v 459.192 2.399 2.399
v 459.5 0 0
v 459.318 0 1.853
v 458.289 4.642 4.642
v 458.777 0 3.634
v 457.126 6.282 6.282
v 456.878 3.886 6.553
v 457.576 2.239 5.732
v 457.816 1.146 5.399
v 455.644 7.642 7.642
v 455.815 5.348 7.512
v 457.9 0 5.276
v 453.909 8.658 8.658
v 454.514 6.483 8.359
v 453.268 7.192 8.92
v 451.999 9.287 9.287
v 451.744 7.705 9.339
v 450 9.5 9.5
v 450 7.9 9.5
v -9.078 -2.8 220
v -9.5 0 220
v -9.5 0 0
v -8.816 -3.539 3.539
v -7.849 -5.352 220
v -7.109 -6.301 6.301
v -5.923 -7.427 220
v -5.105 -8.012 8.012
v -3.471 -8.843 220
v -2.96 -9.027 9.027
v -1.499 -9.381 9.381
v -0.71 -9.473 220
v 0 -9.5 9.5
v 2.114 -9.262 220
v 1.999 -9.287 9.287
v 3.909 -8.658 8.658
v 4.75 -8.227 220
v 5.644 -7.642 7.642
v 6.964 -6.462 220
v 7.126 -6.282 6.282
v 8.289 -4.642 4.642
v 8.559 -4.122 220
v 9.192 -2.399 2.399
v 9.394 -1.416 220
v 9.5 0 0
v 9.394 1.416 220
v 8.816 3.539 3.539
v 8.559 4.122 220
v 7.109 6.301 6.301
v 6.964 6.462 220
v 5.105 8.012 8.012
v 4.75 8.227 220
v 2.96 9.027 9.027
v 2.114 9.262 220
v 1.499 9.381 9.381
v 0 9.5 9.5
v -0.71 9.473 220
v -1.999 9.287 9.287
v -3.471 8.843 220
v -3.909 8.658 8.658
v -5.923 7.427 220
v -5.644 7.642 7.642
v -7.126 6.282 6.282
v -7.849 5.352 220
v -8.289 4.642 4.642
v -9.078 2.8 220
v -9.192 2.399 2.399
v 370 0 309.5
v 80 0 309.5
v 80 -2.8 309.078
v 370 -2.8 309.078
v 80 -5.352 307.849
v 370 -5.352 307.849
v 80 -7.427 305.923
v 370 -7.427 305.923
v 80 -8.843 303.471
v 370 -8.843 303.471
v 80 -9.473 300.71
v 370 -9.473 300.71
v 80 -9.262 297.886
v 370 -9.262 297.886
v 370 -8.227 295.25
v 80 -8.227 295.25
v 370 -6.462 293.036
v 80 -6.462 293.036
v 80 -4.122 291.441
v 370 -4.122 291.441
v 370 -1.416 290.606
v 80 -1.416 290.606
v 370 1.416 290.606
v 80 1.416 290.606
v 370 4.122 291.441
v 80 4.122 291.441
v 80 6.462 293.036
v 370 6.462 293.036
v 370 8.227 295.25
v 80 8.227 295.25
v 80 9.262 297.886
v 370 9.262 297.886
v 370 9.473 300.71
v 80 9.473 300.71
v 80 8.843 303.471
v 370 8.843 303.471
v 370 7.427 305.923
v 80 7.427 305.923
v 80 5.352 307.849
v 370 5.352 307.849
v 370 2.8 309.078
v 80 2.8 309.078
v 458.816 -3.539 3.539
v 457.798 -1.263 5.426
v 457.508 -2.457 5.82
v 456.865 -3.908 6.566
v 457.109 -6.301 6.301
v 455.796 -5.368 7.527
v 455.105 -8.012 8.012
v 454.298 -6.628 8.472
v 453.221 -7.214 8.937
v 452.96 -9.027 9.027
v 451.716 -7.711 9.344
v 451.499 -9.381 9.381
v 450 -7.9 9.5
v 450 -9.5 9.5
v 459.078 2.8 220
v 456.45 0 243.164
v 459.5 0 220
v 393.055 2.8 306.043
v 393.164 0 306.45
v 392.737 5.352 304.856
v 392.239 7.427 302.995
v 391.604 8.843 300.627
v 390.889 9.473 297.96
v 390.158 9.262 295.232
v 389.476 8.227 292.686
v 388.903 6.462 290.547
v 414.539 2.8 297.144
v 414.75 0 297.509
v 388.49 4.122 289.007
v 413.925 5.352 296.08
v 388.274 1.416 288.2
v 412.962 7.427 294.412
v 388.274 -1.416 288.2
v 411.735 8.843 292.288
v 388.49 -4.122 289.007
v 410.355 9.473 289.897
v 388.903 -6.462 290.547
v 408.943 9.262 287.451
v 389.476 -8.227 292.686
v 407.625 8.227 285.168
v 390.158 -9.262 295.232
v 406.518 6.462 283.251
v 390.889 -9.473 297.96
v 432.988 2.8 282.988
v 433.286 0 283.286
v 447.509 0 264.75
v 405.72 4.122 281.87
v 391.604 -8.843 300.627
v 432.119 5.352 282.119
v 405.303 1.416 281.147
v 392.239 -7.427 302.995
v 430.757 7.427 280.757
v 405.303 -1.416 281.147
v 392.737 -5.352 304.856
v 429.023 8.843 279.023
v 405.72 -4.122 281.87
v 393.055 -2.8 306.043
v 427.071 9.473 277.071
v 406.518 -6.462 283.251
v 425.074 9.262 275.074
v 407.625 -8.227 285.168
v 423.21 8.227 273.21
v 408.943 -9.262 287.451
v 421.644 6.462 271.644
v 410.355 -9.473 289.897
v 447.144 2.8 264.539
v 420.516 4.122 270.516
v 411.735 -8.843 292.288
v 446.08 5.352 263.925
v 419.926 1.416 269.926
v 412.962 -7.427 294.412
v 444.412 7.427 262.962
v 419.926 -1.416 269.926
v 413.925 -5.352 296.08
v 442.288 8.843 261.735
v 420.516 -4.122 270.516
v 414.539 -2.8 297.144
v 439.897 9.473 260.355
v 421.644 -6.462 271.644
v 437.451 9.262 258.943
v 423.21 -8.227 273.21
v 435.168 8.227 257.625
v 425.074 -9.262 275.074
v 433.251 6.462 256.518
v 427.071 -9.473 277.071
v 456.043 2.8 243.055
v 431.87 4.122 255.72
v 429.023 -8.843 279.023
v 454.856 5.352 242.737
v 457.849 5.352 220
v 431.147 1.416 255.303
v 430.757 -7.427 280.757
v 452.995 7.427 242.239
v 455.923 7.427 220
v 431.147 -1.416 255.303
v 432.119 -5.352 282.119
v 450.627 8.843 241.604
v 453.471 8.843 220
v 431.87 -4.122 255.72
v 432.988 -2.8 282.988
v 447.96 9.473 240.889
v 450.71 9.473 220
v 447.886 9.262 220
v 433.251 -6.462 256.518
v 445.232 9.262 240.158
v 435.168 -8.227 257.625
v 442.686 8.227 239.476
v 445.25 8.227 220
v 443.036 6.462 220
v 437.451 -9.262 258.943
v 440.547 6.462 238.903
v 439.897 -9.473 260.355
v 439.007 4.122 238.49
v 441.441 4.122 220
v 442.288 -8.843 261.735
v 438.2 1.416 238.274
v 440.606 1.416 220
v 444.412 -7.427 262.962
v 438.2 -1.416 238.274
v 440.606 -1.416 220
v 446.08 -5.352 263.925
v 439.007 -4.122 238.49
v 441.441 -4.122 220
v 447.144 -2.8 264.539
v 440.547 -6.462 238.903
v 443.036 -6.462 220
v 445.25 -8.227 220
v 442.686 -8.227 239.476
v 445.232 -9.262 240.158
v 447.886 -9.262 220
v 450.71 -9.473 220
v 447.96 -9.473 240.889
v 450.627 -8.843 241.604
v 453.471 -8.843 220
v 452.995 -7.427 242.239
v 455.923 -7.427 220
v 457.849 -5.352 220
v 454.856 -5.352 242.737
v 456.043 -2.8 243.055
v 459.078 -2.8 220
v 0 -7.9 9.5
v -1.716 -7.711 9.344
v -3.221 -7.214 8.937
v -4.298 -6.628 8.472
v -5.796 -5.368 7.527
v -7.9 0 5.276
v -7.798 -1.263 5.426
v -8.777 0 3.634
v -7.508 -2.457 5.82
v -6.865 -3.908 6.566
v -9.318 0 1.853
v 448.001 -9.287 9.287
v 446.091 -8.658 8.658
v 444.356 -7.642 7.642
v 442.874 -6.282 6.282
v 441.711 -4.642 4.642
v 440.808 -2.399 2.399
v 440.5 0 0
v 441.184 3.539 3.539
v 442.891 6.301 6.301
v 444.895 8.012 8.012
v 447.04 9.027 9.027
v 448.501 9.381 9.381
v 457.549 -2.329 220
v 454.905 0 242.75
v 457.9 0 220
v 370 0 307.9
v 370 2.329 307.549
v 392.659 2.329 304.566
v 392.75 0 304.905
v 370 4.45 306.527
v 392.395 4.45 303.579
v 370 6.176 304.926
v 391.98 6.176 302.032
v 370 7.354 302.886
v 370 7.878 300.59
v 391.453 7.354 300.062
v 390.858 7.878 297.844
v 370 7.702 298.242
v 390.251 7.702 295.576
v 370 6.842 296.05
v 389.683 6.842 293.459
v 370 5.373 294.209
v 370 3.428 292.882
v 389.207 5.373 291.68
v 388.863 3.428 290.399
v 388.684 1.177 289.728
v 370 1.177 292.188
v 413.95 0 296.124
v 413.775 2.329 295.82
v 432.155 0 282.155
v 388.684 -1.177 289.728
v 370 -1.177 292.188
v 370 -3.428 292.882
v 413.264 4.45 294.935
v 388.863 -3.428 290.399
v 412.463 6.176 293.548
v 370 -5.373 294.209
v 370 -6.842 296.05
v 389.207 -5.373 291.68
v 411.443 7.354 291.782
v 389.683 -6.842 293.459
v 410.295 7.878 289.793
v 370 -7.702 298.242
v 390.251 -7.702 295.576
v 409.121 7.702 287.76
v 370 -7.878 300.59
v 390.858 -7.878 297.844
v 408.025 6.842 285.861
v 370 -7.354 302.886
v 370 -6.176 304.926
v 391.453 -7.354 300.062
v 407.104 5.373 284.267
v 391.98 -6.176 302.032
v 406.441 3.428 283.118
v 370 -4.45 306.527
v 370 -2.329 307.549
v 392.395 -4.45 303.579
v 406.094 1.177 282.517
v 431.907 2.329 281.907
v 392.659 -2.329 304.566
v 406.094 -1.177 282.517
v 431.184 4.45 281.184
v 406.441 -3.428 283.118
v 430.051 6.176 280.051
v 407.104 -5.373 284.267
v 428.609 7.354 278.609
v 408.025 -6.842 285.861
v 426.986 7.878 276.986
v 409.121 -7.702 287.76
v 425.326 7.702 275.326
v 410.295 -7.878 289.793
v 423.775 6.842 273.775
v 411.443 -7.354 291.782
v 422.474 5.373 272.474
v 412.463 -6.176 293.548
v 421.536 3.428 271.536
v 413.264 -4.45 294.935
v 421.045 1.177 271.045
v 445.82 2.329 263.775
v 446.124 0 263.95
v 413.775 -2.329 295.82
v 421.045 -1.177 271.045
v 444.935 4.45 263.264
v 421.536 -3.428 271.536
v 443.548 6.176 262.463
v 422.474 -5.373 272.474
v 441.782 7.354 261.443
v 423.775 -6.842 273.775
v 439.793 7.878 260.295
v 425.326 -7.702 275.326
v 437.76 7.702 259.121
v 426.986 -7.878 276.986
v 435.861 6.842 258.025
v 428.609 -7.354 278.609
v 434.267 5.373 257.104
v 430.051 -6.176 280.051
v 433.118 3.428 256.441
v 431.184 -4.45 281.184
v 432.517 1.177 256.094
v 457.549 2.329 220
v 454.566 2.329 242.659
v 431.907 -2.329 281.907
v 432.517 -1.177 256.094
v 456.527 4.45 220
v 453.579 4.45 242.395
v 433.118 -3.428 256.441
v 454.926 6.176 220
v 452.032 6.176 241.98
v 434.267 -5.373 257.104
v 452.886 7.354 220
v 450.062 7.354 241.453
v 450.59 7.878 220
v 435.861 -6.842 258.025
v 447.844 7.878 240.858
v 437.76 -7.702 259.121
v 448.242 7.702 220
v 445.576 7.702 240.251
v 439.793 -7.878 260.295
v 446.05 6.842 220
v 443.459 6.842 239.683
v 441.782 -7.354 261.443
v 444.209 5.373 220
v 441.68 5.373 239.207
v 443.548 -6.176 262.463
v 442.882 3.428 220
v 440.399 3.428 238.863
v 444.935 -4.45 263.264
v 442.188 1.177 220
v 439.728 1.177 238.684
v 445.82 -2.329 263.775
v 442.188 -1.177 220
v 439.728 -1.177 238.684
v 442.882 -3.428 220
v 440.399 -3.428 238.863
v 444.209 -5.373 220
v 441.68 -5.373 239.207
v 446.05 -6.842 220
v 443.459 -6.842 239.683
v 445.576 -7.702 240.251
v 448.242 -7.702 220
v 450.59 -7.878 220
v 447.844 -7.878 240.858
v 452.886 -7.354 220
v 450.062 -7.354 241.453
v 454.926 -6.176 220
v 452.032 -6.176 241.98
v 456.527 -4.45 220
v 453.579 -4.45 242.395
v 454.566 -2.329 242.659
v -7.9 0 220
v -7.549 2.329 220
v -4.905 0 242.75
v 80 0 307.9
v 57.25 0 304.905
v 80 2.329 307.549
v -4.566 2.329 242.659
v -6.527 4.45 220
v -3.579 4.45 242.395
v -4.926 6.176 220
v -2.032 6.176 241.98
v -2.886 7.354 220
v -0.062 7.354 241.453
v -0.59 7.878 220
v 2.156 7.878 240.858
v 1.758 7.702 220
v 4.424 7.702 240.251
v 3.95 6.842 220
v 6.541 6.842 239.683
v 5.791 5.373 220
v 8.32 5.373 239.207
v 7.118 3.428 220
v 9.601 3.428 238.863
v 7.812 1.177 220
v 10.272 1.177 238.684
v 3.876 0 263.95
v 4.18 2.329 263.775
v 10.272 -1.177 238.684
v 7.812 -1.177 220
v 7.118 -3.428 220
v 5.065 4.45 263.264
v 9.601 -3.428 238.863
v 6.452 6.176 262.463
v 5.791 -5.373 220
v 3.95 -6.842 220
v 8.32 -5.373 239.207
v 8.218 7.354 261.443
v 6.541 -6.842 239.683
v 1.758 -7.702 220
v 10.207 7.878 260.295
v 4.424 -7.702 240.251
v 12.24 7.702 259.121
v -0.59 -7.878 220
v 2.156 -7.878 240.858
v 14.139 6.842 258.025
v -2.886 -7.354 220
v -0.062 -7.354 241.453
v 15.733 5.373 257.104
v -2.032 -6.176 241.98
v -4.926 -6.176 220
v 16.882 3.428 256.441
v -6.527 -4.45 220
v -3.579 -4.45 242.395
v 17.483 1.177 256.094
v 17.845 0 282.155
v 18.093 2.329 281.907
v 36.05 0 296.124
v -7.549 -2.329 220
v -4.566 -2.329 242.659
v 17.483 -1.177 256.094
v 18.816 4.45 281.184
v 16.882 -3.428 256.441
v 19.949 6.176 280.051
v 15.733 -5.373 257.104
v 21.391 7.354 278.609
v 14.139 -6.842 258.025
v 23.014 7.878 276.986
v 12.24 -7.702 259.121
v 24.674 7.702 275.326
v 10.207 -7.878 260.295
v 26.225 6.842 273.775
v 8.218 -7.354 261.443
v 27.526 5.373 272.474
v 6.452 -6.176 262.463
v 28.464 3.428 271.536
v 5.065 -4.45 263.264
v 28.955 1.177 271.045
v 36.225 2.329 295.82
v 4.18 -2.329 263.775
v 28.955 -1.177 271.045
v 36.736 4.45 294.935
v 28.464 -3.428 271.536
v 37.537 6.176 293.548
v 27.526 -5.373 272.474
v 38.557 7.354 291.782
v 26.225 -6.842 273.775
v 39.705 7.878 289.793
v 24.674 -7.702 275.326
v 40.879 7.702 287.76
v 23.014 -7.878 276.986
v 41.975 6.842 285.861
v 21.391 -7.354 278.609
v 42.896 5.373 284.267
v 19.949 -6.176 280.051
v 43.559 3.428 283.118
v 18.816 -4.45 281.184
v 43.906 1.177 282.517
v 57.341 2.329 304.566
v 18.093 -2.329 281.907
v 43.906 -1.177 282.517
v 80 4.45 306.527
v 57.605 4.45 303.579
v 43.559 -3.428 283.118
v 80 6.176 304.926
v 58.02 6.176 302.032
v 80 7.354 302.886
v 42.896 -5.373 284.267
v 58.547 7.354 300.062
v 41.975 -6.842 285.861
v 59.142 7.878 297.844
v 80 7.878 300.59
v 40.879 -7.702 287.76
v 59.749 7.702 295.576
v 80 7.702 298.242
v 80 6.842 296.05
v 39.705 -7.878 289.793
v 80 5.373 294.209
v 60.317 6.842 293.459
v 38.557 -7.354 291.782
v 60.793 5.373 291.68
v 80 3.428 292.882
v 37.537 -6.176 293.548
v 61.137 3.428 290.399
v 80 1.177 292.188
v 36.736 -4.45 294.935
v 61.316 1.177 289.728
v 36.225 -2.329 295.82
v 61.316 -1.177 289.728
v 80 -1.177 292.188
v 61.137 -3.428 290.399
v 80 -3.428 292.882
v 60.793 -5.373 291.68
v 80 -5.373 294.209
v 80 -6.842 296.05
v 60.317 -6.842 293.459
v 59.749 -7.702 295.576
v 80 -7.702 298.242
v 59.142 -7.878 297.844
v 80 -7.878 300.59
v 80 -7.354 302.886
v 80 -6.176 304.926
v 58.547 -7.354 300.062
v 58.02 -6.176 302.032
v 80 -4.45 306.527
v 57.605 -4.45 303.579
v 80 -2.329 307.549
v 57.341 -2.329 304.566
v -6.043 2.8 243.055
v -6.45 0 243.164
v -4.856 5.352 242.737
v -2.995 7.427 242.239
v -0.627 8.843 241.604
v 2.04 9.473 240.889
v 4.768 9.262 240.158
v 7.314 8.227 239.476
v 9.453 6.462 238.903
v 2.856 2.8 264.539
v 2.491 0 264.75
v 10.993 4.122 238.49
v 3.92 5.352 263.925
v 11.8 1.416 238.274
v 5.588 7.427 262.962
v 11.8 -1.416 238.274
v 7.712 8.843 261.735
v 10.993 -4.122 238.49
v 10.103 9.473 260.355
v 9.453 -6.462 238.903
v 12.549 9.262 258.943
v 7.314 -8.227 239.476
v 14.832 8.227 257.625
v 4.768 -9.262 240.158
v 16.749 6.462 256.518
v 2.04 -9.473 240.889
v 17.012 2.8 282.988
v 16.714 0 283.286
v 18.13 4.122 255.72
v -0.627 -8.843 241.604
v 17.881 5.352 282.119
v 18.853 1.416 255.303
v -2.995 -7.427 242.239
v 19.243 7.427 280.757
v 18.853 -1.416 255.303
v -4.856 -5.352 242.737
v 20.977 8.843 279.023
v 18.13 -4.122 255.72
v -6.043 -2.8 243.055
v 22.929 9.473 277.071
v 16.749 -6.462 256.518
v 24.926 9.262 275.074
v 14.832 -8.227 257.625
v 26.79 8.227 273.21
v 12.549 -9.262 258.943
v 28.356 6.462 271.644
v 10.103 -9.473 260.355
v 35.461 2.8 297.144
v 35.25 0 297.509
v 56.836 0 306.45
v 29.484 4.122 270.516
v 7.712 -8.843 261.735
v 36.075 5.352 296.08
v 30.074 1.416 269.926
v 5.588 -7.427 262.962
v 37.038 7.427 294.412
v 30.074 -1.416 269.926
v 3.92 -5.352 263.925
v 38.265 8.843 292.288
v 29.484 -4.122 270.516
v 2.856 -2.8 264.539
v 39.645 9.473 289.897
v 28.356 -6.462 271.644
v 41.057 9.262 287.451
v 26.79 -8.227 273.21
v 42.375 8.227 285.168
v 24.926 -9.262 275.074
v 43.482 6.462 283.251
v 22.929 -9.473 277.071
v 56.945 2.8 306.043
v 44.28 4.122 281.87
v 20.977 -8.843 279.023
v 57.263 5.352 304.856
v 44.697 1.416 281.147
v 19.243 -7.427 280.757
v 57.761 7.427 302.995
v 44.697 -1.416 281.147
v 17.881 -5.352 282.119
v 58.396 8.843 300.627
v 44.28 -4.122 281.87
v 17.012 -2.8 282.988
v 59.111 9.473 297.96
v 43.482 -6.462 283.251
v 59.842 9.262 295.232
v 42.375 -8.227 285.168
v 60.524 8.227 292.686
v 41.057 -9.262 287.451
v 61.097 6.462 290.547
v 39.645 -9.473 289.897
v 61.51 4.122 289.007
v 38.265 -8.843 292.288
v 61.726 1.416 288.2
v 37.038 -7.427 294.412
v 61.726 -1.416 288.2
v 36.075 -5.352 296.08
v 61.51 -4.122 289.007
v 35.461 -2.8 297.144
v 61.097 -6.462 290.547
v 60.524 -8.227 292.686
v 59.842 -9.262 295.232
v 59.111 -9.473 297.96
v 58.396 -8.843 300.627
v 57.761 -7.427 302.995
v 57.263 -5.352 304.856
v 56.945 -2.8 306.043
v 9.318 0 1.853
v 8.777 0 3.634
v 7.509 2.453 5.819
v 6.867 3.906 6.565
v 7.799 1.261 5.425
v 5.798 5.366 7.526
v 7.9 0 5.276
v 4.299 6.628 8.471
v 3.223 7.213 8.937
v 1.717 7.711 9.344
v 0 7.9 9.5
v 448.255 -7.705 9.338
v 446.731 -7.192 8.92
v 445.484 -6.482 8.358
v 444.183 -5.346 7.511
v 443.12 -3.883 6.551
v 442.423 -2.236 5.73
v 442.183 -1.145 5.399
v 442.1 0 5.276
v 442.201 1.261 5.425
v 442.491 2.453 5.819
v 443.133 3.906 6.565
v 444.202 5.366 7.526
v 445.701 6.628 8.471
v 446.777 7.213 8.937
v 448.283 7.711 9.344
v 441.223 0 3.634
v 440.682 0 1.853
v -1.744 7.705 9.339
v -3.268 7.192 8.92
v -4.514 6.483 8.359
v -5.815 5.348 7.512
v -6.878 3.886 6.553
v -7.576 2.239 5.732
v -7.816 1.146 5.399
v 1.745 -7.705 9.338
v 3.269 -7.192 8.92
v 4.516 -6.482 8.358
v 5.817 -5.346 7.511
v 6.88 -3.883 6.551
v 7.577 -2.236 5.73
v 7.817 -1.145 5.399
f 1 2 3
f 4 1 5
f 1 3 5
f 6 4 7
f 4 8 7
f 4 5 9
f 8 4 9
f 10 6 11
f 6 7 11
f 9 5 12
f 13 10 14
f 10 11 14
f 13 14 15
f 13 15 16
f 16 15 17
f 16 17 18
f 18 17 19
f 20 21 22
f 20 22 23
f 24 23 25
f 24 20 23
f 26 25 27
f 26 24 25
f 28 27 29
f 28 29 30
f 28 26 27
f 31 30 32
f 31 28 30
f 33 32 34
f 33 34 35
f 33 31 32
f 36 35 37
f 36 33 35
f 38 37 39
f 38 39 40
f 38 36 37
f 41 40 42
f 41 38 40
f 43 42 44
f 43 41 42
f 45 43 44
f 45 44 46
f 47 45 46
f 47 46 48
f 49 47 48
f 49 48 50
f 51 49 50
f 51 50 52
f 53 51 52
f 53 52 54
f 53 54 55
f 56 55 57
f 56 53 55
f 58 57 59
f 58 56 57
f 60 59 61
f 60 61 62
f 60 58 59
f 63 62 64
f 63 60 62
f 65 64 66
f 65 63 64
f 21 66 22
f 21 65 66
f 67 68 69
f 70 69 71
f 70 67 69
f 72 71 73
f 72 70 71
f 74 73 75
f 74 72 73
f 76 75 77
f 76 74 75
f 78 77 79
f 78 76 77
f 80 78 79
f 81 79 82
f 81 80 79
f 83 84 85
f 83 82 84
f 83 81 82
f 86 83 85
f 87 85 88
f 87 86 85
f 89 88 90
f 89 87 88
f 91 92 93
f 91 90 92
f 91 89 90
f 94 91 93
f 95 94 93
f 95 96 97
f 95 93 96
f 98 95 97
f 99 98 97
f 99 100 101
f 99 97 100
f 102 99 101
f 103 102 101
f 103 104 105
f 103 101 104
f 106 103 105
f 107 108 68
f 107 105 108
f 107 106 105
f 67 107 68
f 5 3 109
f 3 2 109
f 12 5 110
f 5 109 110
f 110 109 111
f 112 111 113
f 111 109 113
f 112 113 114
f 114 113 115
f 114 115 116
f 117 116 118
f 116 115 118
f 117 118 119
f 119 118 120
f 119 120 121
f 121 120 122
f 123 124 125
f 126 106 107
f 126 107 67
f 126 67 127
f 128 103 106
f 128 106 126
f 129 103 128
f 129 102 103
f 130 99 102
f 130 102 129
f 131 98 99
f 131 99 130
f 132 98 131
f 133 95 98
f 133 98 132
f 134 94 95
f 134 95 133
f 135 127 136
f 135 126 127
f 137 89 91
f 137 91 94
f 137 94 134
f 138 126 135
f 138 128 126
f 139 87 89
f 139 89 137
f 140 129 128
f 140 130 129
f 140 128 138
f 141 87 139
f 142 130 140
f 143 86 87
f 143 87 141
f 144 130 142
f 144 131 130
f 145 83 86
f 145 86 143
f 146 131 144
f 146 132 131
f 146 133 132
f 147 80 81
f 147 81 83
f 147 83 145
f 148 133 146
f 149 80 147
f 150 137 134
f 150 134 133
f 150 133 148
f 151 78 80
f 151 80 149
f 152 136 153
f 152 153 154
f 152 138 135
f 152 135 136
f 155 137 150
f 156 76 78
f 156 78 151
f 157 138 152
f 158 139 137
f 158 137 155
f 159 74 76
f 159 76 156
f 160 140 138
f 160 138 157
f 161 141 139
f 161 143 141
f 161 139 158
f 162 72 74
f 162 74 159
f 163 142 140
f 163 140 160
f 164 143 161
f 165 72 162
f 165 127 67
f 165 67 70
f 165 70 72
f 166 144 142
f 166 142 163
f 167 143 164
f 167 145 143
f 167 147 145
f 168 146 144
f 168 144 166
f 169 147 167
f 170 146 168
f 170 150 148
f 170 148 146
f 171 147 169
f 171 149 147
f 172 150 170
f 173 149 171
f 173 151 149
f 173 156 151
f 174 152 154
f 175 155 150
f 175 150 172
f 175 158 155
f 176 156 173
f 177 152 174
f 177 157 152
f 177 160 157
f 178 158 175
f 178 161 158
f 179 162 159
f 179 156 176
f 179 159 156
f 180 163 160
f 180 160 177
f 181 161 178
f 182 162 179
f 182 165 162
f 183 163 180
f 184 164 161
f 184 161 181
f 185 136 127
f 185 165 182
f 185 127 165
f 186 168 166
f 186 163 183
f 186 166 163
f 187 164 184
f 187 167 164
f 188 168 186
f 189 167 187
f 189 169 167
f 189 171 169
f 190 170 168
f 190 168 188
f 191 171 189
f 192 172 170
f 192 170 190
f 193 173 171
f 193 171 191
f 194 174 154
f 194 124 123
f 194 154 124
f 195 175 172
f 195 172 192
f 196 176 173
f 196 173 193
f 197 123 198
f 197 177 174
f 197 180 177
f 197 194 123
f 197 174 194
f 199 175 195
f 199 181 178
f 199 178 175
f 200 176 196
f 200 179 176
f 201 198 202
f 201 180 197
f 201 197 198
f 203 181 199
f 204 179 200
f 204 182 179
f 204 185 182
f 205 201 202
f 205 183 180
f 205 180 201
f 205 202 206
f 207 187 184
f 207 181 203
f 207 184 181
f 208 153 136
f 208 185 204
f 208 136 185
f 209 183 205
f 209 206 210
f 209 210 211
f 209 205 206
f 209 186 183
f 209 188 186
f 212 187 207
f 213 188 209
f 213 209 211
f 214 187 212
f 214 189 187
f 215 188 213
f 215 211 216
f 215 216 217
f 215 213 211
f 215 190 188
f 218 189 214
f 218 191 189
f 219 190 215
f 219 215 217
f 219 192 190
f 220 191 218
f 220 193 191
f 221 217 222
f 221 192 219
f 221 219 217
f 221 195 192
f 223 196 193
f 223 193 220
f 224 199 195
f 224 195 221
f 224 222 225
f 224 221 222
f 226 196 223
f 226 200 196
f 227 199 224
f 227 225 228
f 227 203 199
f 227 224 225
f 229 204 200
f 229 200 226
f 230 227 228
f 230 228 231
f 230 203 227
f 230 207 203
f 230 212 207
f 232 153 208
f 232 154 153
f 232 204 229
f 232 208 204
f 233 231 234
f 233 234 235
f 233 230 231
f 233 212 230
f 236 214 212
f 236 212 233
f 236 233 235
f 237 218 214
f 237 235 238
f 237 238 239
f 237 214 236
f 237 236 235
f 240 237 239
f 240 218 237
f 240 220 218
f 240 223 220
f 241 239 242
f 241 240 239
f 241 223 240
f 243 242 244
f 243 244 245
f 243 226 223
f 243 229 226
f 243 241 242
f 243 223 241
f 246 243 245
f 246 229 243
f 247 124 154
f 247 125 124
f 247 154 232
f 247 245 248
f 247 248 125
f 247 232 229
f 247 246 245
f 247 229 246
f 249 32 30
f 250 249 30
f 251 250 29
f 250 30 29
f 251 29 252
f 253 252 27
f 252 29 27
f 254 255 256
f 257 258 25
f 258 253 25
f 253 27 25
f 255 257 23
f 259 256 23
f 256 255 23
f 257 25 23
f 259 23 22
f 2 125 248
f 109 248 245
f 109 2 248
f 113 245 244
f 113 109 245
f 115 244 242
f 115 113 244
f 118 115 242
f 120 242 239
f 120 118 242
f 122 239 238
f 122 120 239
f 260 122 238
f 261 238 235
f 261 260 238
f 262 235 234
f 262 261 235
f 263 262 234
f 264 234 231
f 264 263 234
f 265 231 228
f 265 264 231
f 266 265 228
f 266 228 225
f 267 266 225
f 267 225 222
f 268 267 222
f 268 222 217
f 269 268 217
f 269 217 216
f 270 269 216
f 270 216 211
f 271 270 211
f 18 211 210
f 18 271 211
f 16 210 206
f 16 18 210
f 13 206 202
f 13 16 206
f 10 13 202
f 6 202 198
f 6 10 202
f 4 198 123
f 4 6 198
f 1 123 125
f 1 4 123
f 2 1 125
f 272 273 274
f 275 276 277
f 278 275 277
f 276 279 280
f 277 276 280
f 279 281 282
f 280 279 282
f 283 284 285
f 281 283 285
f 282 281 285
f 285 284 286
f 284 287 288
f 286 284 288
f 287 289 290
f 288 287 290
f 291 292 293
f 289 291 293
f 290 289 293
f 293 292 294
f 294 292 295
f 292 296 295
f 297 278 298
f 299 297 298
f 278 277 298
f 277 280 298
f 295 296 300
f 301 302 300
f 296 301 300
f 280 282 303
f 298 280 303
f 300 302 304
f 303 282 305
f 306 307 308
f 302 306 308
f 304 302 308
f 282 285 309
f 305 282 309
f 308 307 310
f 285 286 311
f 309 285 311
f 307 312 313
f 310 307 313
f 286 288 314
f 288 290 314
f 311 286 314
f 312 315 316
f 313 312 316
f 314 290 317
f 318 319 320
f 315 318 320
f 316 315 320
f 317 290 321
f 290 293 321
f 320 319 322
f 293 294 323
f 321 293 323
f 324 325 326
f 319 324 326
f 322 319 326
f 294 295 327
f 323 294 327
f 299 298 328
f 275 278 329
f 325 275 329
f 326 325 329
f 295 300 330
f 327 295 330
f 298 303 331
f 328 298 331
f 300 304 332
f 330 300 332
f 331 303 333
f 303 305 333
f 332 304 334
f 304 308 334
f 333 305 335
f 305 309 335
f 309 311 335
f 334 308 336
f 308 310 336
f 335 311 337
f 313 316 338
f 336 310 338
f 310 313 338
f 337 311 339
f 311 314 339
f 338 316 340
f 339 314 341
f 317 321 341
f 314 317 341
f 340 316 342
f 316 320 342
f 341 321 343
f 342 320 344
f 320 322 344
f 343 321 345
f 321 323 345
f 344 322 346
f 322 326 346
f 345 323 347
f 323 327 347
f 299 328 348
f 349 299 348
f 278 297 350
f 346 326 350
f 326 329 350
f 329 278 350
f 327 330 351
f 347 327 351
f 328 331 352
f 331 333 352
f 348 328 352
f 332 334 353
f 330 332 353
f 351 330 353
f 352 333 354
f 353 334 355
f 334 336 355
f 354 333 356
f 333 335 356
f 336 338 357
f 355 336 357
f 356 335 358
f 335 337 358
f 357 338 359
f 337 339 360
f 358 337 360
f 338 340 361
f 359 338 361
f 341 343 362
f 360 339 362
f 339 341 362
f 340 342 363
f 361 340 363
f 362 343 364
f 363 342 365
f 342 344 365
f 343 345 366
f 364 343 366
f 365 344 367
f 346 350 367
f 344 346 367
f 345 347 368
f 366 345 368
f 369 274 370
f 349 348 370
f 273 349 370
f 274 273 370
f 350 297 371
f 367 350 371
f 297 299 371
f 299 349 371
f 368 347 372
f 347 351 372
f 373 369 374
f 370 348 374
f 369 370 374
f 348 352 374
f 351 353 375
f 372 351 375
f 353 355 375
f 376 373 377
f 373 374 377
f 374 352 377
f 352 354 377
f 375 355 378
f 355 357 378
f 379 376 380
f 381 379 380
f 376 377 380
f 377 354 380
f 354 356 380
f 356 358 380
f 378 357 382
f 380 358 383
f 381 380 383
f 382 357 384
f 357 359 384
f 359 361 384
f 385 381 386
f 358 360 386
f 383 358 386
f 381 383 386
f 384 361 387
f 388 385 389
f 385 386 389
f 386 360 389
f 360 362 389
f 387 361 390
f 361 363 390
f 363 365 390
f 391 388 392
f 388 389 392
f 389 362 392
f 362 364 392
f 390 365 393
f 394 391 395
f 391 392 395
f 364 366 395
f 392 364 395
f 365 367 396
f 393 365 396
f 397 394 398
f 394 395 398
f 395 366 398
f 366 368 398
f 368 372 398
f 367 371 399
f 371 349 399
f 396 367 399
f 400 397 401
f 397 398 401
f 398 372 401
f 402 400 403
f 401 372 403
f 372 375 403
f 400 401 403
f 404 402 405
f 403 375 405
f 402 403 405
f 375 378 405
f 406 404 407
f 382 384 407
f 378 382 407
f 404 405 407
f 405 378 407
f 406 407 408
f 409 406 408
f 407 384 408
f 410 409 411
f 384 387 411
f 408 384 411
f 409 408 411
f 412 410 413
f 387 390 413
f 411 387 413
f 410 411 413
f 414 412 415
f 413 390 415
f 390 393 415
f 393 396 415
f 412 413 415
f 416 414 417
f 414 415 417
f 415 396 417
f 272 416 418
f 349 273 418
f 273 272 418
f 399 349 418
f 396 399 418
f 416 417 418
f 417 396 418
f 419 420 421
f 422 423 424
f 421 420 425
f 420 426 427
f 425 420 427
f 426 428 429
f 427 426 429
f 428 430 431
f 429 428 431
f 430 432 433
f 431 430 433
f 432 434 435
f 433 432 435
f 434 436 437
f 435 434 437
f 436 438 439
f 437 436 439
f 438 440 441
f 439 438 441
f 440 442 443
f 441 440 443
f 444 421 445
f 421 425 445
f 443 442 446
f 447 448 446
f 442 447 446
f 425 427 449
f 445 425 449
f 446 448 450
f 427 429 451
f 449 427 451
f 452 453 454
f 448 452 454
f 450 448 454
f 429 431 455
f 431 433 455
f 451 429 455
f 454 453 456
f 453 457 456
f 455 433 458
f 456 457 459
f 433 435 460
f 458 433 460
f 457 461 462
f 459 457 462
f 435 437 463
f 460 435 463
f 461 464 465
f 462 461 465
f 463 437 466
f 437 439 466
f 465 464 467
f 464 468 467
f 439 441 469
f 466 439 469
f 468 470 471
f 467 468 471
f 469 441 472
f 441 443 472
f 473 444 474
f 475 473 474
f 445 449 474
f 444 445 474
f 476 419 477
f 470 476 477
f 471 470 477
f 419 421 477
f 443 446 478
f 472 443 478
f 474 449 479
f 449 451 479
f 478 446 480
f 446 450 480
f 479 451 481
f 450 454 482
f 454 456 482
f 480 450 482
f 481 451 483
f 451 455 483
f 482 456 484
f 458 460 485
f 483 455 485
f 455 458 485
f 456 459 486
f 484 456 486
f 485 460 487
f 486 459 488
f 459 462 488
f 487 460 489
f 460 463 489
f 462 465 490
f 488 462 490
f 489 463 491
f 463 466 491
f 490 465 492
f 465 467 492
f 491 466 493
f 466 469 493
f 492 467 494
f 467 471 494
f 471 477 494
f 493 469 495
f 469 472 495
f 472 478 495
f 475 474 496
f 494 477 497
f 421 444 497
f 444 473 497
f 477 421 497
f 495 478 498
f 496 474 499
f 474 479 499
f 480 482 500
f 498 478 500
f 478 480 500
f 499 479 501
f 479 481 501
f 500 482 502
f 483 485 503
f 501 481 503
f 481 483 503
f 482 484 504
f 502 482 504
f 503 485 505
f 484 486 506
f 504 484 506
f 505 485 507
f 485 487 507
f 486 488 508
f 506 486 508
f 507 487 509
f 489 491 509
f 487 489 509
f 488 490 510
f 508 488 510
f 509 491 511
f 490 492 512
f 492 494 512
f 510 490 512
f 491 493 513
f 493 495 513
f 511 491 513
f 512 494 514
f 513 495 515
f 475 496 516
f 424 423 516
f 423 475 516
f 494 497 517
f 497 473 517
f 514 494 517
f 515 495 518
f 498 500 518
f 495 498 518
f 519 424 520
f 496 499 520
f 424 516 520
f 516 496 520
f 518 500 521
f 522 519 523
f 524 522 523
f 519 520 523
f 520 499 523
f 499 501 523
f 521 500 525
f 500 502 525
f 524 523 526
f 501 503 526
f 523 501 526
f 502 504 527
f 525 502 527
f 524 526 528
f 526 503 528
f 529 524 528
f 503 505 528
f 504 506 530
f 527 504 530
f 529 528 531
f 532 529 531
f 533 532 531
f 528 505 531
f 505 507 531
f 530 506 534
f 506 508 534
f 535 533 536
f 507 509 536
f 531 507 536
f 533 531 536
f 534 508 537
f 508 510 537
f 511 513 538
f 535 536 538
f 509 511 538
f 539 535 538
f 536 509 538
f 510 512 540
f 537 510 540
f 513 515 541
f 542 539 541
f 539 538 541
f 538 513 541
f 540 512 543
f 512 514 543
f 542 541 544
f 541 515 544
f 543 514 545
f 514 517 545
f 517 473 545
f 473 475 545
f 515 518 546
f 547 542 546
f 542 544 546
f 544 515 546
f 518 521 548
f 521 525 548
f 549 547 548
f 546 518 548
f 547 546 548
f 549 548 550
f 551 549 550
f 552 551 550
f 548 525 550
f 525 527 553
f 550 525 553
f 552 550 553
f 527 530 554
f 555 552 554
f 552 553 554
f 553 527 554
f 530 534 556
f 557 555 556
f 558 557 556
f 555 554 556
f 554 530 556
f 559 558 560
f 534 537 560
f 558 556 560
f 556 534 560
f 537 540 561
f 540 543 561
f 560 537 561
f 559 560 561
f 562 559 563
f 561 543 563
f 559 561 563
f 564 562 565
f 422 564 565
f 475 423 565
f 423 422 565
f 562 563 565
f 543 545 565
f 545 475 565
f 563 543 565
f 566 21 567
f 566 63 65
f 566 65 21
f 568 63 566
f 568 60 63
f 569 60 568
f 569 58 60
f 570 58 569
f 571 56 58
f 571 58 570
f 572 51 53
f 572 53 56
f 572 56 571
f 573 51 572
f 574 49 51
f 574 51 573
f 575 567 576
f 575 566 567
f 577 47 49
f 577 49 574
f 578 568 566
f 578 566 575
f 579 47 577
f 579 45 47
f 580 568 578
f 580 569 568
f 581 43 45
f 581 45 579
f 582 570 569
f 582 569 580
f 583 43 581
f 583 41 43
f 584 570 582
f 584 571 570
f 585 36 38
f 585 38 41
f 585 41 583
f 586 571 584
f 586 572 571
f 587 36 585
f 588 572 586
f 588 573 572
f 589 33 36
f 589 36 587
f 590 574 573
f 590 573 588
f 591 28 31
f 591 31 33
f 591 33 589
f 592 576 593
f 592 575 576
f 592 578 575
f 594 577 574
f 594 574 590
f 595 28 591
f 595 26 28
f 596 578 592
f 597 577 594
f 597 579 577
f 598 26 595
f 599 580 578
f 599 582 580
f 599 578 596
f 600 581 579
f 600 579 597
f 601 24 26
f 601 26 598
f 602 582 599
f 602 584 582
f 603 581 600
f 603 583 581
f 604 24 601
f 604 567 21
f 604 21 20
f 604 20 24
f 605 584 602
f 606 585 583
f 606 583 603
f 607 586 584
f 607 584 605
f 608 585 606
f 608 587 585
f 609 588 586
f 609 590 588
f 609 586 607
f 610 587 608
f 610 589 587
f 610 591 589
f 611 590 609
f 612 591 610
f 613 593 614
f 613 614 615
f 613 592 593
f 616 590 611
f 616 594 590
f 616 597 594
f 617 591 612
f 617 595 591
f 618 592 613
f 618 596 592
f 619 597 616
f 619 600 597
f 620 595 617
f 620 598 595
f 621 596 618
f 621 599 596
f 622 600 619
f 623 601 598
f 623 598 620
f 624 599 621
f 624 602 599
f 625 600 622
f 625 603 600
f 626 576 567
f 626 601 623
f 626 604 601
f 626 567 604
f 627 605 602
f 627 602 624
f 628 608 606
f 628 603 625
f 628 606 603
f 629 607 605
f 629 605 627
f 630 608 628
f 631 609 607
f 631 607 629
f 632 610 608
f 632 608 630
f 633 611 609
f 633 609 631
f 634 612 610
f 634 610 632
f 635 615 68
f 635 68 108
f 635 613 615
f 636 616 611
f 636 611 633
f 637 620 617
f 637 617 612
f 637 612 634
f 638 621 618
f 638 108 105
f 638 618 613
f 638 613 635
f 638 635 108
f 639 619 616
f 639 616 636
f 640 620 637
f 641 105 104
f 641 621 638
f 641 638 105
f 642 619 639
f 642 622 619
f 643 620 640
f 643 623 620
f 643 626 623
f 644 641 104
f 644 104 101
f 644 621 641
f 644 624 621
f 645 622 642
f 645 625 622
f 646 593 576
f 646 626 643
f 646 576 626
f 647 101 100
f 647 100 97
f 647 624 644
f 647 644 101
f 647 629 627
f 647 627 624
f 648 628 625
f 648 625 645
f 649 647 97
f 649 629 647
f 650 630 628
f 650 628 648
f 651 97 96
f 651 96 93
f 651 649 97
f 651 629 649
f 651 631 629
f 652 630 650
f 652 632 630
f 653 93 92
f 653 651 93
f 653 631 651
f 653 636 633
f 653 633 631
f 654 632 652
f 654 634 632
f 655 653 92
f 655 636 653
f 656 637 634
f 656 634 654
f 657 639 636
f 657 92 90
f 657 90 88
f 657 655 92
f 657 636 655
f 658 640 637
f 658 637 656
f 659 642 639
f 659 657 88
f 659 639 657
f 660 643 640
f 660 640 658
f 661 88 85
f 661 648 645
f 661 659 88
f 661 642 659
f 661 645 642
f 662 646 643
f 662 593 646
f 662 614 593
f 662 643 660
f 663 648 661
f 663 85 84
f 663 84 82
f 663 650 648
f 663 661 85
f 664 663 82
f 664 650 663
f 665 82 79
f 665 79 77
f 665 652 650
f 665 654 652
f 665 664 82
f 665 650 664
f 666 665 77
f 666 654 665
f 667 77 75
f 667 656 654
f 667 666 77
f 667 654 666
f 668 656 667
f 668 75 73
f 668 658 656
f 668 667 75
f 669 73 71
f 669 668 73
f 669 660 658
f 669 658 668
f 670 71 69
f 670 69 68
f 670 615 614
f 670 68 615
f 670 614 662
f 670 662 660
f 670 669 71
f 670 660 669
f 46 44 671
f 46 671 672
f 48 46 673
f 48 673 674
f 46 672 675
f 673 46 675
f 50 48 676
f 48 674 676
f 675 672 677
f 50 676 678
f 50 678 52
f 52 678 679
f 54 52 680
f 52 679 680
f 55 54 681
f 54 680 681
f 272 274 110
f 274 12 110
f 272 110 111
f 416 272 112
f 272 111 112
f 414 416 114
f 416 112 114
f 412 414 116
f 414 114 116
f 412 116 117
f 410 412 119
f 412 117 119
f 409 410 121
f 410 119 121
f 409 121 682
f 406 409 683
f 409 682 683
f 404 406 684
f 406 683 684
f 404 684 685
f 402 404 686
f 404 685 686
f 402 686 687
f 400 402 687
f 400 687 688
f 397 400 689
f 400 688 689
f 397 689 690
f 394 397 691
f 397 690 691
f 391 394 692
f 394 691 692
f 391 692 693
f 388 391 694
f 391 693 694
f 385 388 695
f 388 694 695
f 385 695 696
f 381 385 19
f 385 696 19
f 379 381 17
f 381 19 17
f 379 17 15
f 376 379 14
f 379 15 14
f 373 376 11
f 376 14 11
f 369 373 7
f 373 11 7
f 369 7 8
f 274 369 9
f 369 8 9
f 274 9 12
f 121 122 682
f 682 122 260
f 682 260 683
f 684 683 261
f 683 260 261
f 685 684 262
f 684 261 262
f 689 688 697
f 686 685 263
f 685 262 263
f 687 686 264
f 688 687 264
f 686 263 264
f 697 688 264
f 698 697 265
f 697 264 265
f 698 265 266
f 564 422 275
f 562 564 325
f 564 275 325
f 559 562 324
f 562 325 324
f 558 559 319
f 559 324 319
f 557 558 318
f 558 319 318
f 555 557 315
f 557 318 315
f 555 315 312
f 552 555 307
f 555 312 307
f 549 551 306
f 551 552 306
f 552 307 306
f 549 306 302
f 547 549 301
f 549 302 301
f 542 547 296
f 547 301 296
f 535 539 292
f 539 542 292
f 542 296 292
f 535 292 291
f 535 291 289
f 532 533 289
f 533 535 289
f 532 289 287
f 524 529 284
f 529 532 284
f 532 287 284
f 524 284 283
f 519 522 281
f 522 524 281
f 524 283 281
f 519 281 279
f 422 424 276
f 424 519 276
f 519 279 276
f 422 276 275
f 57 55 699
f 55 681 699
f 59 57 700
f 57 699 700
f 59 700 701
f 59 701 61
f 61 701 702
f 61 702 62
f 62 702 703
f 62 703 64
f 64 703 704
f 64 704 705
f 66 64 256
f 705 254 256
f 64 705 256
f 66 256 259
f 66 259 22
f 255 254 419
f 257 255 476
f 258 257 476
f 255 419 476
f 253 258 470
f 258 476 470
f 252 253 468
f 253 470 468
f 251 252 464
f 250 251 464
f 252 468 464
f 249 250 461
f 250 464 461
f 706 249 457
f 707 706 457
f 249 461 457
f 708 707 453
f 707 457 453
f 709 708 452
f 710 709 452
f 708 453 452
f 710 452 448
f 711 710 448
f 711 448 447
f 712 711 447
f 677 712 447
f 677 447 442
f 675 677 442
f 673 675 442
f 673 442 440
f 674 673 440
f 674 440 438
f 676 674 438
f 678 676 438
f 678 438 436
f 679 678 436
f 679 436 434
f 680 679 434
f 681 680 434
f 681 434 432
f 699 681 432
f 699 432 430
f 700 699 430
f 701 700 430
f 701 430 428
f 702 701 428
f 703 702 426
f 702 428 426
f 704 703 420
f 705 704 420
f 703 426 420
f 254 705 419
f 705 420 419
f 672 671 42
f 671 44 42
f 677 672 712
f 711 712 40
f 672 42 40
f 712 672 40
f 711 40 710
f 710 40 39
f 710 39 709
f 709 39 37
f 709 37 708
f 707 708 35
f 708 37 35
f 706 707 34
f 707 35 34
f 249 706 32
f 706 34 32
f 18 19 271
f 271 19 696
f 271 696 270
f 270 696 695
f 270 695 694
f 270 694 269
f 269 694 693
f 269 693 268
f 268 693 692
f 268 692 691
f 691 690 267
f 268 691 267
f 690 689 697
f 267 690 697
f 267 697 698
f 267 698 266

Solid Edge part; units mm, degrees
sketch "Sketch1" plane through (0, 0, 0) normal (0, -1, 0) x (1, 0, 0)
  line L0 (0, 0) -> (0, 220)
  arc A0 (0, 220) -> (80, 300) centre (80, 220) cw
  line L1 (80, 300) -> (370, 300)
  arc A1 (370, 300) -> (450, 220) centre (370, 220) cw
  line L2 (450, 220) -> (450, 0)
  dimension "D1" = 80
  dimension "D2" = 300
  dimension "D3" = 450
sketch "Sketch2" plane through (0, 0, 0) normal (0, 0, -1) x (-1, 0, 0)
  circle A0 centre (0, 0) radius 9.5
  dimension "D1" = 19
sweep "SweptProtrusion_1" add profiles "Sketch2" path "Sketch1"
shell "Thinwall_1" thickness 1.6 removed faces 4 at (6.5233, -6.1433, 0) at (443.4767, -6.1433, 0) at (6.5233, -6.1433, 0) at (443.4767, -6.1433, 0)
hole "Hole_1" at (0, 0, 0) direction (0, -1, 0) diameter 19 end through all both ways yes
hole "Hole1" at (450, 0, 0) direction (0, -1, 0) diameter 19 end through all both ways yes
properties material "Aluminum, 1060"
